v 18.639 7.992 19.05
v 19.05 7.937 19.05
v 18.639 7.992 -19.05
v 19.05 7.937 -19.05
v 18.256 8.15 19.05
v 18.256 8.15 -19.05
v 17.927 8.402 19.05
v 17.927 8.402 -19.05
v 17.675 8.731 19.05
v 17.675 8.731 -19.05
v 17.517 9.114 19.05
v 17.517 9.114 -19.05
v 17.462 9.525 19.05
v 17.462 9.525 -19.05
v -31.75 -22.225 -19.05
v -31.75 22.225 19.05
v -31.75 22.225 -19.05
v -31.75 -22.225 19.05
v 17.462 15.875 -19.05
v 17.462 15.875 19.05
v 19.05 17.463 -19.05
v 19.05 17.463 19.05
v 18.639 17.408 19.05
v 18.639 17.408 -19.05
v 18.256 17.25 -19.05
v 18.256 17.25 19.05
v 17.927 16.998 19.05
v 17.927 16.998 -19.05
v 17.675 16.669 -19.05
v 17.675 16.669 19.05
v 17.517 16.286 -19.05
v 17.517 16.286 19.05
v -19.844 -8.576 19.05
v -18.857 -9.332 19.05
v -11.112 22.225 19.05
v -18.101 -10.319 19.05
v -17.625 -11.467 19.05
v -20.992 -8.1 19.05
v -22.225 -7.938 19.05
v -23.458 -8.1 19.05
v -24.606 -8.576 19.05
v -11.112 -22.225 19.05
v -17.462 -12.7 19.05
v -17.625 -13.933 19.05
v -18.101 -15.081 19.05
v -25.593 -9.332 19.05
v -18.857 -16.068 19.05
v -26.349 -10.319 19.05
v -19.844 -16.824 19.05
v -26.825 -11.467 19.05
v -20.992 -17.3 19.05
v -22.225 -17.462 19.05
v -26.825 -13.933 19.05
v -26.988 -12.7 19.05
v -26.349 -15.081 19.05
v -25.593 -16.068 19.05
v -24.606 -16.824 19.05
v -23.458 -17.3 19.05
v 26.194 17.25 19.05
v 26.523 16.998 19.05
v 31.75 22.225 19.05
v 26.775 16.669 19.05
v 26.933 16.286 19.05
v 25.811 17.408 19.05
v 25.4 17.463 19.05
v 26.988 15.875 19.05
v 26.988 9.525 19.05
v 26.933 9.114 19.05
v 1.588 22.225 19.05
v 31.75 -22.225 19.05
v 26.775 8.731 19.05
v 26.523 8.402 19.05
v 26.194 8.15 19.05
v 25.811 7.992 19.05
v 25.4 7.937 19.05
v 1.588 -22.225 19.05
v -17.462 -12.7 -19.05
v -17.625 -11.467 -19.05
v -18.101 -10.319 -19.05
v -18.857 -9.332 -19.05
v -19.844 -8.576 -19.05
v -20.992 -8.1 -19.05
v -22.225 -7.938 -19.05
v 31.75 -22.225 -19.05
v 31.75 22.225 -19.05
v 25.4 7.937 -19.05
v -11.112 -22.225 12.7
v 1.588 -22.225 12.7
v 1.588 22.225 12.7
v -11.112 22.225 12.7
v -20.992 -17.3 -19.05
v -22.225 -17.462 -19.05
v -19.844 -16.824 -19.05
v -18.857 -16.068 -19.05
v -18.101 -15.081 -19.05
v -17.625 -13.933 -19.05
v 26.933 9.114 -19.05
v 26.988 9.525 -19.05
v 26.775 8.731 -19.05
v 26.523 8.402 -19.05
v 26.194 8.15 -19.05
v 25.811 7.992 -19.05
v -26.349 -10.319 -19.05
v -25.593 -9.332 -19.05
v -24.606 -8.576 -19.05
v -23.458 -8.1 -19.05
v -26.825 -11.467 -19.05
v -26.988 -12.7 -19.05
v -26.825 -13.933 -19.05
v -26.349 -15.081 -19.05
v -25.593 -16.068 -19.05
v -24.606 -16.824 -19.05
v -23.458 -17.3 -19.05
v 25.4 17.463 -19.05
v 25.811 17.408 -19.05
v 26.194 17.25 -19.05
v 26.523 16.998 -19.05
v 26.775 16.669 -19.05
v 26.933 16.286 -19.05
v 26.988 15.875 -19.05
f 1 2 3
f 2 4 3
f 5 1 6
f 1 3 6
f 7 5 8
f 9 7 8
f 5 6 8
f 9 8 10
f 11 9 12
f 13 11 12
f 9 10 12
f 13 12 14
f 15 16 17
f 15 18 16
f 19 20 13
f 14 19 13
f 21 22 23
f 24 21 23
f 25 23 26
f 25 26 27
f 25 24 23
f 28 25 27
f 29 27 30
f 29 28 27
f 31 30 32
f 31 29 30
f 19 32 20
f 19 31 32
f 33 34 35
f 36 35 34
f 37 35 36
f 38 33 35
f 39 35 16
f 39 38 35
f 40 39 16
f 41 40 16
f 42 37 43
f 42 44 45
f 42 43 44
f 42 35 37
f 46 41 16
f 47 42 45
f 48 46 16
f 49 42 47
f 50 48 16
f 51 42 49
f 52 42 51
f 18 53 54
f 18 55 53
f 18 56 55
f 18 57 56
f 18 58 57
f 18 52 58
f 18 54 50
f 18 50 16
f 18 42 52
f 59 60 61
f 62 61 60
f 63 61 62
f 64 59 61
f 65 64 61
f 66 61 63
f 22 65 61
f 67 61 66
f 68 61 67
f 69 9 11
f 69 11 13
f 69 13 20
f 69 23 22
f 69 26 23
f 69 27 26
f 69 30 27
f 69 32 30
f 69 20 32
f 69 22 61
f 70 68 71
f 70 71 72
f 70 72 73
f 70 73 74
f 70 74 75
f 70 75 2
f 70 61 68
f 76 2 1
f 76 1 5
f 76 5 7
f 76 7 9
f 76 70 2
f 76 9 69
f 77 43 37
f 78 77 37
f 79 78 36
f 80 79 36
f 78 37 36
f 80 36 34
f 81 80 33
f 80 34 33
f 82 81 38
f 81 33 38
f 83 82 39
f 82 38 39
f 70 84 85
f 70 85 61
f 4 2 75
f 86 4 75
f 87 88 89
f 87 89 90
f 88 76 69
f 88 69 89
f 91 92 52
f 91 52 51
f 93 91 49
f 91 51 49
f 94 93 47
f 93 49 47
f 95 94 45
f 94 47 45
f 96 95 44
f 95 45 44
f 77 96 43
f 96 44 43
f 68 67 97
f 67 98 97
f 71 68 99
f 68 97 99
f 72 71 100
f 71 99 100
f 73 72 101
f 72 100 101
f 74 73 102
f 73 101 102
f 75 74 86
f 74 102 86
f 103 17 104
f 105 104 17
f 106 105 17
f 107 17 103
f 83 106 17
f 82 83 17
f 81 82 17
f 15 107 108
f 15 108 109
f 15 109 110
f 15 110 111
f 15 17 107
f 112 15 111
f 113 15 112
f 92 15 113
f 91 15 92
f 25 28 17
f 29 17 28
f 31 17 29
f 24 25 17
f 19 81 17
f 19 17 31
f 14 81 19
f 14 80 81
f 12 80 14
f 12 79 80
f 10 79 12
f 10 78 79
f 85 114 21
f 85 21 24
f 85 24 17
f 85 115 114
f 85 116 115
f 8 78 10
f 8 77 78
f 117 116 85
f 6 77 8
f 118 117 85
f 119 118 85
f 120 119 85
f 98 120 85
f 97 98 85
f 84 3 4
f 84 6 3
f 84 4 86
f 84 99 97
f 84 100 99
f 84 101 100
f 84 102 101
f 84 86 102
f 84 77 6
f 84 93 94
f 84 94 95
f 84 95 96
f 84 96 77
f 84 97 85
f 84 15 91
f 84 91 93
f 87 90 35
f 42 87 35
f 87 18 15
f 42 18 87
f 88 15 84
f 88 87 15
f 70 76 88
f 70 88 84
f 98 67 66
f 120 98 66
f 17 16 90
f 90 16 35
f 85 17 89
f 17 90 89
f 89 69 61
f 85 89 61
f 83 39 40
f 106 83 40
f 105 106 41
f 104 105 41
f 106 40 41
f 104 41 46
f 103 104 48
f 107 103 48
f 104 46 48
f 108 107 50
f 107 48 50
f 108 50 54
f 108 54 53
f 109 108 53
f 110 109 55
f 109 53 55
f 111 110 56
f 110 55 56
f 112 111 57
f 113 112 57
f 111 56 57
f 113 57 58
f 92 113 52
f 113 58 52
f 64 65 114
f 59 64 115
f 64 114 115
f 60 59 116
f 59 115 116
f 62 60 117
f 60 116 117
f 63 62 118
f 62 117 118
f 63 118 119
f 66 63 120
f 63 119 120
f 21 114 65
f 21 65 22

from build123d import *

# Parameters (mm, degrees)
F1_DEPTH = 22.225
F2_W     = 4.7625
F2_H     = 4.7625
F3_DEPTH = 38.101
F4_R     = 1.5875


with BuildPart() as f1:
    # F0 (on Front) → F1 (new body, symmetric)
    with BuildSketch(Plane.XZ):
        Polygon((-31.75, -19.05), (31.75, -19.05), (31.75, 19.05), (1.5875, 19.05), (1.5875, 12.7), (-11.1125, 12.7), (-11.1125, 19.05), (-31.75, 19.05), align=None)
    extrude(amount=F1_DEPTH, both=True)

    # F2 (on face) → F3 (cut, through all)
    with BuildSketch(Plane.XY.offset(19.05)):
        with BuildLine():
            ThreePointArc((-26.9875, -12.7), (-25.592596, -16.067596), (-22.225, -17.4625))
            Line((-22.225, -17.4625), (-22.225, -12.7))
            Line((-22.225, -12.7), (-26.9875, -12.7))
        make_face()
        with BuildLine():
            Line((-22.225, -12.7), (-22.225, -17.4625))
            ThreePointArc((-22.225, -17.4625), (-18.857404, -16.067596), (-17.4625, -12.7))
            Line((-17.4625, -12.7), (-22.225, -12.7))
        make_face()
        with BuildLine():
            Line((-26.9875, -12.7), (-22.225, -12.7))
            Line((-22.225, -12.7), (-22.225, -7.9375))
            ThreePointArc((-22.225, -7.9375), (-25.592596, -9.332404), (-26.9875, -12.7))
        make_face()
        with BuildLine():
            Line((-22.225, -7.9375), (-22.225, -12.7))
            Line((-22.225, -12.7), (-17.4625, -12.7))
            ThreePointArc((-17.4625, -12.7), (-18.857404, -9.332404), (-22.225, -7.9375))
        make_face()
        with Locations((24.60625, 15.08125)):
            Rectangle(F2_W, F2_H)
        with Locations((19.84375, 15.08125)):
            Rectangle(F2_W, F2_H)
        with Locations((24.60625, 10.31875)):
            Rectangle(F2_W, F2_H)
        with Locations((19.84375, 10.31875)):
            Rectangle(F2_W, F2_H)
    extrude(amount=-F3_DEPTH, mode=Mode.SUBTRACT)

    # F4
    f4_edges = [f1.edges().sort_by_distance(p)[0] for p in [
        (17.4625, 17.4625, 0),
        (17.4625, 7.9375, 0),
        (26.9875, 7.9375, 0),
        (26.9875, 17.4625, 0),
    ]]
    fillet(f4_edges, radius=F4_R)


solid = f1.part
